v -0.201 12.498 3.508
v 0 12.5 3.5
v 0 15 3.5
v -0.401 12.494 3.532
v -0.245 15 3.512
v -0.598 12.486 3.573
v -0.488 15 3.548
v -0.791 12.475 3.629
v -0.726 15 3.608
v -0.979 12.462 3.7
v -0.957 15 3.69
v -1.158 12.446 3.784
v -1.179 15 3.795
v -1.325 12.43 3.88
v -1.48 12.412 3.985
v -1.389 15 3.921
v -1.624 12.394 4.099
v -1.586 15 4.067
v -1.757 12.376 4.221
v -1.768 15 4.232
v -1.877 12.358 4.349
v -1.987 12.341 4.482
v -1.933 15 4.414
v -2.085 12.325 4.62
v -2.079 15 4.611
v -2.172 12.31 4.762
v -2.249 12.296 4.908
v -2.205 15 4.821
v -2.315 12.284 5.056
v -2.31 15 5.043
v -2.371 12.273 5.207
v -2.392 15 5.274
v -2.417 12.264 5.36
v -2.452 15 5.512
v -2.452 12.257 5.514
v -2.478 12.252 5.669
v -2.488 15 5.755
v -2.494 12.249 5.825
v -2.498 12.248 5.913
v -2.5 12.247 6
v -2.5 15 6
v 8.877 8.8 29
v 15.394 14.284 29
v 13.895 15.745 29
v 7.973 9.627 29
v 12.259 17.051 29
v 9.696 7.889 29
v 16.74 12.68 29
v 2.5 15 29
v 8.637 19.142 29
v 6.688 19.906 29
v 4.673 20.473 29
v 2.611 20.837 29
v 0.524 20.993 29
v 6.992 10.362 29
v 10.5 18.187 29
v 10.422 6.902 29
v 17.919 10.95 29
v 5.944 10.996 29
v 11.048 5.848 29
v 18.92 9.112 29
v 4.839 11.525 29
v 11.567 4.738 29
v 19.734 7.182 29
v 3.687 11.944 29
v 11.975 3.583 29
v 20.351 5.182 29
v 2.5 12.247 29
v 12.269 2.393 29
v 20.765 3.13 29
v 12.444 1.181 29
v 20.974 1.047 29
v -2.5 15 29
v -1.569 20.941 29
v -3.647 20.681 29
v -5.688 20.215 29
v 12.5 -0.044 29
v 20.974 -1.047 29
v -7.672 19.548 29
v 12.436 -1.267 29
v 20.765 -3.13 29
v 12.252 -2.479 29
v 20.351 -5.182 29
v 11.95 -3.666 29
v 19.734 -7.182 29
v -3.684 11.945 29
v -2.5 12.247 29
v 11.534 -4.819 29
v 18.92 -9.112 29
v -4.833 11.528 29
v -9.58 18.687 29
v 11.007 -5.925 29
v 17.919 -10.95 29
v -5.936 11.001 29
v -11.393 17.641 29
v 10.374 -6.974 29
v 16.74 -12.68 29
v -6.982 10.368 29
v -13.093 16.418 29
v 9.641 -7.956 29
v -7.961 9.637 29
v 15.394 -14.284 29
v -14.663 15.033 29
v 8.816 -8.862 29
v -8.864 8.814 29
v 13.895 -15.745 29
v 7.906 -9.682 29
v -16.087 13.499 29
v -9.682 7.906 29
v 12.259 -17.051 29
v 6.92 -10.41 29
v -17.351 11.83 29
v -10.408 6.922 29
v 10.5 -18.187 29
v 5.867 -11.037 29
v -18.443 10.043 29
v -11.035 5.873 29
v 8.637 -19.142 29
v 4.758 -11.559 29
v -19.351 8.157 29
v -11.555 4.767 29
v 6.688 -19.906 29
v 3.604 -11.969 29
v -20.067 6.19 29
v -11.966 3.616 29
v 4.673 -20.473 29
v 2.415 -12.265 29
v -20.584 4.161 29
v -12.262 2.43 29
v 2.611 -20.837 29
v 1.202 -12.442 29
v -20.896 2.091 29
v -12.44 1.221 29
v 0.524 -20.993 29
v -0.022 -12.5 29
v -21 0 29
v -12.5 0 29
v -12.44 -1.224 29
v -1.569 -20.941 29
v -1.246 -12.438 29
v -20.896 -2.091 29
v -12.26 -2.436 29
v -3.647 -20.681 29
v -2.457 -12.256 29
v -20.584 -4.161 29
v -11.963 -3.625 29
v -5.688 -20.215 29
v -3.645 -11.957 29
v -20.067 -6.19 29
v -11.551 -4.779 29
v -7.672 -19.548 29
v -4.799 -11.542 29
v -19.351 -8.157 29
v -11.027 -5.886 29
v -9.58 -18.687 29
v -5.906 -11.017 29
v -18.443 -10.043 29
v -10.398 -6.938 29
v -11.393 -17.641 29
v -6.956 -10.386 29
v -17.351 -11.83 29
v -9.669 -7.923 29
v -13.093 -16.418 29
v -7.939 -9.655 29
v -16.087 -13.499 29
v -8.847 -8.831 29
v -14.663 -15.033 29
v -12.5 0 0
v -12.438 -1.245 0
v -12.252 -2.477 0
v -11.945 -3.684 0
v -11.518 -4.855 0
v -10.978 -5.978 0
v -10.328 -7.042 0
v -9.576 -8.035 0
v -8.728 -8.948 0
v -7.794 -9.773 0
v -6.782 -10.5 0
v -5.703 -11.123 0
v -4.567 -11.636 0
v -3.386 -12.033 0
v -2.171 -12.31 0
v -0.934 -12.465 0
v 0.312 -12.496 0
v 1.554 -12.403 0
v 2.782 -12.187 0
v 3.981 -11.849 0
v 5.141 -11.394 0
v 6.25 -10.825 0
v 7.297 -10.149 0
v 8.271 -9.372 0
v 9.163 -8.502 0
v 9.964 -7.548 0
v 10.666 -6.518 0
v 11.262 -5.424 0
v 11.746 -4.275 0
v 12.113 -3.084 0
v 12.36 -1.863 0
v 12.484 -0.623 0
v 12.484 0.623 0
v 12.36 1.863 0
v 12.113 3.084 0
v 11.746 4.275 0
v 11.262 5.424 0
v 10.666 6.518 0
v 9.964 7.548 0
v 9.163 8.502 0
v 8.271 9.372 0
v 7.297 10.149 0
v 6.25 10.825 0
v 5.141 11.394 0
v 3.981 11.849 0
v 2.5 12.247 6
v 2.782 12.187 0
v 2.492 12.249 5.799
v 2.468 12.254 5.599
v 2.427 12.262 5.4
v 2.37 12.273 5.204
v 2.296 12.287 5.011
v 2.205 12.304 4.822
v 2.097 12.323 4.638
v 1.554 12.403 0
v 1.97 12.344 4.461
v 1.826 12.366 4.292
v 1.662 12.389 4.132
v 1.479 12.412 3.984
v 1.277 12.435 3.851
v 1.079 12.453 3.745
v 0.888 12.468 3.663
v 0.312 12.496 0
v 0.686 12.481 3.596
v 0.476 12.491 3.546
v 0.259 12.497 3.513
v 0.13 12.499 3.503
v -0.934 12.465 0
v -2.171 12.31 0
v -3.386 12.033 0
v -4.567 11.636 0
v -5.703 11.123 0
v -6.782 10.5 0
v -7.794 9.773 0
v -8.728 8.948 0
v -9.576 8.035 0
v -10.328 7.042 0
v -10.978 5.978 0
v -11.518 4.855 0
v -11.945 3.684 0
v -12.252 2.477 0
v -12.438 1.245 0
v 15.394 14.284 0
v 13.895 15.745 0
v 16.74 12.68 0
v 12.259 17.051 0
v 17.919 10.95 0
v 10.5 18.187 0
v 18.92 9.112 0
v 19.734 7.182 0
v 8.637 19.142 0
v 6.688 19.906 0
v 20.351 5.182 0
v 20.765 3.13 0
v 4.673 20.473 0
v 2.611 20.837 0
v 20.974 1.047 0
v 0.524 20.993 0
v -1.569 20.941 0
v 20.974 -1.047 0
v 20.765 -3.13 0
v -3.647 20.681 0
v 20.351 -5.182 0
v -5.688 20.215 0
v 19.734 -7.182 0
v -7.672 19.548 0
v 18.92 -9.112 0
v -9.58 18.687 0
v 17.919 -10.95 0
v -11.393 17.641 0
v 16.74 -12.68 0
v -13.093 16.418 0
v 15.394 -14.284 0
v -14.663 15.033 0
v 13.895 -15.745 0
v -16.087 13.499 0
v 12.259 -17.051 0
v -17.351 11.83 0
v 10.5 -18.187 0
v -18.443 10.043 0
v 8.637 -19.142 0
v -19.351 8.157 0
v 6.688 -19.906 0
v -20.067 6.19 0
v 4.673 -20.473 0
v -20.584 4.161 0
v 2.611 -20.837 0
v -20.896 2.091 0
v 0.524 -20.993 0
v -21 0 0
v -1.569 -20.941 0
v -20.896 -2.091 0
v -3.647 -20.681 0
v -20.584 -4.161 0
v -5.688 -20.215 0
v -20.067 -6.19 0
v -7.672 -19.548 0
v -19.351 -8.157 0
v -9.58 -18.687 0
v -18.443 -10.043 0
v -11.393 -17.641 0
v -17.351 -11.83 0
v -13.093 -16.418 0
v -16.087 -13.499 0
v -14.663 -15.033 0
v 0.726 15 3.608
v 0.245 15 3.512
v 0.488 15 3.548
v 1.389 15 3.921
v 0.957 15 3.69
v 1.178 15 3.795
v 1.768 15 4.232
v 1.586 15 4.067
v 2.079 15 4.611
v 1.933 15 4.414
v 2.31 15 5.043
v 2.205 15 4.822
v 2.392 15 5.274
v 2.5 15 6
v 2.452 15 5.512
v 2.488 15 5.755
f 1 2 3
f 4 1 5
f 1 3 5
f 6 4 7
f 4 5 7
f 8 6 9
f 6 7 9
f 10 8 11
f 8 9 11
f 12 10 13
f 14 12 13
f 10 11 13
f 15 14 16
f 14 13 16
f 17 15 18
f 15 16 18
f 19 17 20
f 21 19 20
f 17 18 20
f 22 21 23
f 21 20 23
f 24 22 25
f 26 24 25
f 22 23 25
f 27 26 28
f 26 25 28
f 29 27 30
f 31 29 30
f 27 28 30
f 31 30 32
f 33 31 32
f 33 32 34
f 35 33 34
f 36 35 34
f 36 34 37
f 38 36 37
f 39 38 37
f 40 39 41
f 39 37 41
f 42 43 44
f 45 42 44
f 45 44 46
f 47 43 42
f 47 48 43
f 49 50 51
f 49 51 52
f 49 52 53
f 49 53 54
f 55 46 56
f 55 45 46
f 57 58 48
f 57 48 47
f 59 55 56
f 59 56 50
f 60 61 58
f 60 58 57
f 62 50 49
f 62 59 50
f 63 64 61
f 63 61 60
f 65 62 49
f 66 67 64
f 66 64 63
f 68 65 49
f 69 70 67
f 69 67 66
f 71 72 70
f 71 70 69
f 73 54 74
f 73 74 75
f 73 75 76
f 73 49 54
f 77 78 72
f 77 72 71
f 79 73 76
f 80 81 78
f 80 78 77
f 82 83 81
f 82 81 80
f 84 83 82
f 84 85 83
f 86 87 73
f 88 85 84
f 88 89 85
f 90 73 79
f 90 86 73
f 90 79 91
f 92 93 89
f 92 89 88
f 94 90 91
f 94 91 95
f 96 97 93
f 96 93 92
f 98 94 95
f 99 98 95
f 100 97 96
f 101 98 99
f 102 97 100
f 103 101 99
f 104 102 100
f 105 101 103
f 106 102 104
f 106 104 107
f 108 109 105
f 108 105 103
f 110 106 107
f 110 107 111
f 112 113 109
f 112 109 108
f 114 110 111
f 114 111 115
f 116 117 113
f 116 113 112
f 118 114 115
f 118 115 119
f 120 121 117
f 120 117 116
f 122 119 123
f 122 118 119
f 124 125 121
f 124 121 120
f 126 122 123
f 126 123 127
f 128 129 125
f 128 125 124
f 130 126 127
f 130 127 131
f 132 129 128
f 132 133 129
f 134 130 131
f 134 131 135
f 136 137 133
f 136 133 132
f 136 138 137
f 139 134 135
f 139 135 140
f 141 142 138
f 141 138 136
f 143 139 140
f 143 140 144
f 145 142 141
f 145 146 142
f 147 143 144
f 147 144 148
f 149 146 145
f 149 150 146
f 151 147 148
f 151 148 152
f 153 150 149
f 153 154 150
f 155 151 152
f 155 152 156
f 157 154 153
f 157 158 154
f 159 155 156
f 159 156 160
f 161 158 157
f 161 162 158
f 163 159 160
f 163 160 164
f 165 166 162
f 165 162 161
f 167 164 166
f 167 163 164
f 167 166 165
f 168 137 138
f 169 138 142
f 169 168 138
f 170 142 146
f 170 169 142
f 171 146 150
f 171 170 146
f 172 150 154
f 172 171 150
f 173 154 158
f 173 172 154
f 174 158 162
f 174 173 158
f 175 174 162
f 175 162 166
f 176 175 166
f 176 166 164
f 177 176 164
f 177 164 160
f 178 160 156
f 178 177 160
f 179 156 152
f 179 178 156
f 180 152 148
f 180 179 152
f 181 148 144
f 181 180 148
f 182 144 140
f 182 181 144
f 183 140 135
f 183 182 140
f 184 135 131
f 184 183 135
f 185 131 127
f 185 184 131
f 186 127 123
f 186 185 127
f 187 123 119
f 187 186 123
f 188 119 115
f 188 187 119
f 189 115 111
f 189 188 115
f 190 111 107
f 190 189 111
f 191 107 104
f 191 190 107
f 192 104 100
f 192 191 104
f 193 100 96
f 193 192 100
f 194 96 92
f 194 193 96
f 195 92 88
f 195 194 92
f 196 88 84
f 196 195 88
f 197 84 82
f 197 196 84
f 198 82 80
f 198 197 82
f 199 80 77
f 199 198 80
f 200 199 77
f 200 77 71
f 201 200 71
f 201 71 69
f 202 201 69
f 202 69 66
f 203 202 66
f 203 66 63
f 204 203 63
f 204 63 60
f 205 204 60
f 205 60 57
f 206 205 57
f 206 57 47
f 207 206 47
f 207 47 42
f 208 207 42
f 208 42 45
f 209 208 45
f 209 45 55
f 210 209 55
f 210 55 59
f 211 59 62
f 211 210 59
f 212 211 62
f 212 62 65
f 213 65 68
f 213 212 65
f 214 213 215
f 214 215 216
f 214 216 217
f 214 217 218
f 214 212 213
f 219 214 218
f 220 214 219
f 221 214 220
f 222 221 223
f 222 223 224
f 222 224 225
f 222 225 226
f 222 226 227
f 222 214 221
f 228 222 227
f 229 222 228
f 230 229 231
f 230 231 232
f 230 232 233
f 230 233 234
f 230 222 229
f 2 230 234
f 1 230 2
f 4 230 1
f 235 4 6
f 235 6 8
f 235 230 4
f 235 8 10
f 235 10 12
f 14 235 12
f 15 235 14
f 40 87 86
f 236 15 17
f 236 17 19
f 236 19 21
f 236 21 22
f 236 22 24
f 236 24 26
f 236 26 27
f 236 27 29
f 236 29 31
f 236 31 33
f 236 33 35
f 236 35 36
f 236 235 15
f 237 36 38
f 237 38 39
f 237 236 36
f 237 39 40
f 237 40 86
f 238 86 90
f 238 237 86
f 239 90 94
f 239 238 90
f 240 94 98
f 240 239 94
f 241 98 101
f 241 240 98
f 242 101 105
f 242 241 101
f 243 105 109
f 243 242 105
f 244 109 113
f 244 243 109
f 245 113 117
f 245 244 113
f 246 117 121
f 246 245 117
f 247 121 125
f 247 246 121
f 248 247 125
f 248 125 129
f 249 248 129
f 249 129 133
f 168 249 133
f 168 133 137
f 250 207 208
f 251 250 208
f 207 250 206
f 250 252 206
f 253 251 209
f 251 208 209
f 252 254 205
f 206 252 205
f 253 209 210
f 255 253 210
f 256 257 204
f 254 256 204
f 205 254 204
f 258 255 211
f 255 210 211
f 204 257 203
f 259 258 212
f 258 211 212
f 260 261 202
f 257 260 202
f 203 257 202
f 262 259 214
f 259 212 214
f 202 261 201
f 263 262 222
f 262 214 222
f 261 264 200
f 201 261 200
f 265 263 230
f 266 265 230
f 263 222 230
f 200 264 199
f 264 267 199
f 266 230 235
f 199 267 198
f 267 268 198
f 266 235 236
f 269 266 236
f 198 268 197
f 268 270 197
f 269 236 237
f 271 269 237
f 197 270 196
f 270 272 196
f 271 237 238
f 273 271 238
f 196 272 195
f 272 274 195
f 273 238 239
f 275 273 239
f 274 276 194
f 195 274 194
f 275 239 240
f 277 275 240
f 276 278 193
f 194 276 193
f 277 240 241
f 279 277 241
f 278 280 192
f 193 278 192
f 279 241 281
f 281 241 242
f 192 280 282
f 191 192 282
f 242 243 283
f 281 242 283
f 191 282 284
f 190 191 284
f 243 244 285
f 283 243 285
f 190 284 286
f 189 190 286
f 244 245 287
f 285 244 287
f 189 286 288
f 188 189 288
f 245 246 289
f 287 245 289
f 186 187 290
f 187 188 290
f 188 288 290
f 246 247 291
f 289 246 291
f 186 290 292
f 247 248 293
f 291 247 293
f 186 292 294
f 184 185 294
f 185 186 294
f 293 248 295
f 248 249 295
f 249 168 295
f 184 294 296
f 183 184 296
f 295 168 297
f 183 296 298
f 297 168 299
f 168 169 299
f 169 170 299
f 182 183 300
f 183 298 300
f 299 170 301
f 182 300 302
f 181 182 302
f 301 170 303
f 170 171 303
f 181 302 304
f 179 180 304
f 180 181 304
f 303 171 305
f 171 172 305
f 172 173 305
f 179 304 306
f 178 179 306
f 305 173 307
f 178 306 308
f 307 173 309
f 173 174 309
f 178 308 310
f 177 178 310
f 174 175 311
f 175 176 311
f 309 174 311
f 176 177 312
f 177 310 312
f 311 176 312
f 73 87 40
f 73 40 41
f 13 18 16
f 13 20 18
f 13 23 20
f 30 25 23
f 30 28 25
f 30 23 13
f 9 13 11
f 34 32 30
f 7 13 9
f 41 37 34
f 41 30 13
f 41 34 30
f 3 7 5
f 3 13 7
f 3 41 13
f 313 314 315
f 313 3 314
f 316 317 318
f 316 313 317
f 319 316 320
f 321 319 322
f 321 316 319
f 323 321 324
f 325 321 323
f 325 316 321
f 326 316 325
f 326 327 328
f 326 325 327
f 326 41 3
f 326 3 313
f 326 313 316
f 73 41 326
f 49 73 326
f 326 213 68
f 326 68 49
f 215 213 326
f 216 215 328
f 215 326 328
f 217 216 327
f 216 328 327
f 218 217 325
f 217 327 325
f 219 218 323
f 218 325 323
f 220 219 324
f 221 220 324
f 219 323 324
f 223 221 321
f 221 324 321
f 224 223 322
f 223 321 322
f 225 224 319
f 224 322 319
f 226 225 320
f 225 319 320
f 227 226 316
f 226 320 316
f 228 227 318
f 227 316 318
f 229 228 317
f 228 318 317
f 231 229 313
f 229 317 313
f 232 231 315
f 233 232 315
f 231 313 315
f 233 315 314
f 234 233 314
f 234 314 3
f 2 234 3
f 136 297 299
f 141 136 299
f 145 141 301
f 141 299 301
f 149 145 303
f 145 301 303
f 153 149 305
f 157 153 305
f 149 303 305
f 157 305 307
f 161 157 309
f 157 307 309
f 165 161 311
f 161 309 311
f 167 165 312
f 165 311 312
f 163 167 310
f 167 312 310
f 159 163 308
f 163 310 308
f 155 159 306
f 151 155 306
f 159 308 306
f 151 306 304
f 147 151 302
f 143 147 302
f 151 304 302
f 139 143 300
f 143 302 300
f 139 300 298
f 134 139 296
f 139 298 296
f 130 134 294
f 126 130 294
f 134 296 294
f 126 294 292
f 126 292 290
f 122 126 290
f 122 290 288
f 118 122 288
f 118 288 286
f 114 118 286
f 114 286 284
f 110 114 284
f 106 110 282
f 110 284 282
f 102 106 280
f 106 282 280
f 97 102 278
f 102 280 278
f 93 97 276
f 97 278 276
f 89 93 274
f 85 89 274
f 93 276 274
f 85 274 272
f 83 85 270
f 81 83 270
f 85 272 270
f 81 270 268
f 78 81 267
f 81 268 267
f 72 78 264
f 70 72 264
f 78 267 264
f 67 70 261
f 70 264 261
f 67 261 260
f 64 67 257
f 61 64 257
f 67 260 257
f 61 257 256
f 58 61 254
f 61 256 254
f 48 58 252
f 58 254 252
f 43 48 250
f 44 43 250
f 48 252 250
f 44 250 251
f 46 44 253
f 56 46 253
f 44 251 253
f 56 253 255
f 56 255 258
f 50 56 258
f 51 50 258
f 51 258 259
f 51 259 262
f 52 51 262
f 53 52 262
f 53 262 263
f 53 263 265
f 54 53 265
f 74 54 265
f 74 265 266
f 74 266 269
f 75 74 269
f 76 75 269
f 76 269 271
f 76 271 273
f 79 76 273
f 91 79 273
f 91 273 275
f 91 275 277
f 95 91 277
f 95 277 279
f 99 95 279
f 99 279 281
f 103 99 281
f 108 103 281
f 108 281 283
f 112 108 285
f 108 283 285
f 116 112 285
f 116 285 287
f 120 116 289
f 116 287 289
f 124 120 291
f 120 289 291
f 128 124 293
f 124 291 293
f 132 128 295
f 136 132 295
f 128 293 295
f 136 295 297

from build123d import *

# Parameters (mm, degrees)
SKETCH1_R           = 21
SKETCH1_R_2         = 12.5
BOSS_EXTRUDE4_DEPTH = 29
SKETCH3_W           = 5
SKETCH3_H           = 5
CUT_EXTRUDE3_DEPTH  = 25.5
FILLET5_R           = 2.5
FILLET6_R           = 2.5


with BuildPart() as part:
    # Sketch1 → Boss-Extrude4 (new body)
    with BuildSketch(Plane.XY):
        with Locations(Location((0, 0, 0), (0, 0, 180))):
            Circle(SKETCH1_R)
        with Locations(Location((0, 0, 0), (0, 0, 180))):
            Circle(SKETCH1_R_2, mode=Mode.SUBTRACT)
    extrude(amount=BOSS_EXTRUDE4_DEPTH)

    # Sketch3 → Cut-Extrude3 (cut)
    with BuildSketch(Plane.XY.offset(29)):
        with Locations((0, 12.5)):
            Rectangle(SKETCH3_W, SKETCH3_H)
    extrude(amount=-CUT_EXTRUDE3_DEPTH, mode=Mode.SUBTRACT)

    # Fillet5
    fillet5_edges = [part.edges().sort_by_distance(p)[0] for p in [
        (2.5, 13.623724357, 3.5),
    ]]
    fillet(fillet5_edges, radius=FILLET5_R)

    # Fillet6
    fillet6_edges = [part.edges().sort_by_distance(p)[0] for p in [
        (-2.5, 13.623724357, 3.5),
    ]]
    fillet(fillet6_edges, radius=FILLET6_R - 0.0001)  # a hair under: the kernel refuses the full size


solid = part.part
